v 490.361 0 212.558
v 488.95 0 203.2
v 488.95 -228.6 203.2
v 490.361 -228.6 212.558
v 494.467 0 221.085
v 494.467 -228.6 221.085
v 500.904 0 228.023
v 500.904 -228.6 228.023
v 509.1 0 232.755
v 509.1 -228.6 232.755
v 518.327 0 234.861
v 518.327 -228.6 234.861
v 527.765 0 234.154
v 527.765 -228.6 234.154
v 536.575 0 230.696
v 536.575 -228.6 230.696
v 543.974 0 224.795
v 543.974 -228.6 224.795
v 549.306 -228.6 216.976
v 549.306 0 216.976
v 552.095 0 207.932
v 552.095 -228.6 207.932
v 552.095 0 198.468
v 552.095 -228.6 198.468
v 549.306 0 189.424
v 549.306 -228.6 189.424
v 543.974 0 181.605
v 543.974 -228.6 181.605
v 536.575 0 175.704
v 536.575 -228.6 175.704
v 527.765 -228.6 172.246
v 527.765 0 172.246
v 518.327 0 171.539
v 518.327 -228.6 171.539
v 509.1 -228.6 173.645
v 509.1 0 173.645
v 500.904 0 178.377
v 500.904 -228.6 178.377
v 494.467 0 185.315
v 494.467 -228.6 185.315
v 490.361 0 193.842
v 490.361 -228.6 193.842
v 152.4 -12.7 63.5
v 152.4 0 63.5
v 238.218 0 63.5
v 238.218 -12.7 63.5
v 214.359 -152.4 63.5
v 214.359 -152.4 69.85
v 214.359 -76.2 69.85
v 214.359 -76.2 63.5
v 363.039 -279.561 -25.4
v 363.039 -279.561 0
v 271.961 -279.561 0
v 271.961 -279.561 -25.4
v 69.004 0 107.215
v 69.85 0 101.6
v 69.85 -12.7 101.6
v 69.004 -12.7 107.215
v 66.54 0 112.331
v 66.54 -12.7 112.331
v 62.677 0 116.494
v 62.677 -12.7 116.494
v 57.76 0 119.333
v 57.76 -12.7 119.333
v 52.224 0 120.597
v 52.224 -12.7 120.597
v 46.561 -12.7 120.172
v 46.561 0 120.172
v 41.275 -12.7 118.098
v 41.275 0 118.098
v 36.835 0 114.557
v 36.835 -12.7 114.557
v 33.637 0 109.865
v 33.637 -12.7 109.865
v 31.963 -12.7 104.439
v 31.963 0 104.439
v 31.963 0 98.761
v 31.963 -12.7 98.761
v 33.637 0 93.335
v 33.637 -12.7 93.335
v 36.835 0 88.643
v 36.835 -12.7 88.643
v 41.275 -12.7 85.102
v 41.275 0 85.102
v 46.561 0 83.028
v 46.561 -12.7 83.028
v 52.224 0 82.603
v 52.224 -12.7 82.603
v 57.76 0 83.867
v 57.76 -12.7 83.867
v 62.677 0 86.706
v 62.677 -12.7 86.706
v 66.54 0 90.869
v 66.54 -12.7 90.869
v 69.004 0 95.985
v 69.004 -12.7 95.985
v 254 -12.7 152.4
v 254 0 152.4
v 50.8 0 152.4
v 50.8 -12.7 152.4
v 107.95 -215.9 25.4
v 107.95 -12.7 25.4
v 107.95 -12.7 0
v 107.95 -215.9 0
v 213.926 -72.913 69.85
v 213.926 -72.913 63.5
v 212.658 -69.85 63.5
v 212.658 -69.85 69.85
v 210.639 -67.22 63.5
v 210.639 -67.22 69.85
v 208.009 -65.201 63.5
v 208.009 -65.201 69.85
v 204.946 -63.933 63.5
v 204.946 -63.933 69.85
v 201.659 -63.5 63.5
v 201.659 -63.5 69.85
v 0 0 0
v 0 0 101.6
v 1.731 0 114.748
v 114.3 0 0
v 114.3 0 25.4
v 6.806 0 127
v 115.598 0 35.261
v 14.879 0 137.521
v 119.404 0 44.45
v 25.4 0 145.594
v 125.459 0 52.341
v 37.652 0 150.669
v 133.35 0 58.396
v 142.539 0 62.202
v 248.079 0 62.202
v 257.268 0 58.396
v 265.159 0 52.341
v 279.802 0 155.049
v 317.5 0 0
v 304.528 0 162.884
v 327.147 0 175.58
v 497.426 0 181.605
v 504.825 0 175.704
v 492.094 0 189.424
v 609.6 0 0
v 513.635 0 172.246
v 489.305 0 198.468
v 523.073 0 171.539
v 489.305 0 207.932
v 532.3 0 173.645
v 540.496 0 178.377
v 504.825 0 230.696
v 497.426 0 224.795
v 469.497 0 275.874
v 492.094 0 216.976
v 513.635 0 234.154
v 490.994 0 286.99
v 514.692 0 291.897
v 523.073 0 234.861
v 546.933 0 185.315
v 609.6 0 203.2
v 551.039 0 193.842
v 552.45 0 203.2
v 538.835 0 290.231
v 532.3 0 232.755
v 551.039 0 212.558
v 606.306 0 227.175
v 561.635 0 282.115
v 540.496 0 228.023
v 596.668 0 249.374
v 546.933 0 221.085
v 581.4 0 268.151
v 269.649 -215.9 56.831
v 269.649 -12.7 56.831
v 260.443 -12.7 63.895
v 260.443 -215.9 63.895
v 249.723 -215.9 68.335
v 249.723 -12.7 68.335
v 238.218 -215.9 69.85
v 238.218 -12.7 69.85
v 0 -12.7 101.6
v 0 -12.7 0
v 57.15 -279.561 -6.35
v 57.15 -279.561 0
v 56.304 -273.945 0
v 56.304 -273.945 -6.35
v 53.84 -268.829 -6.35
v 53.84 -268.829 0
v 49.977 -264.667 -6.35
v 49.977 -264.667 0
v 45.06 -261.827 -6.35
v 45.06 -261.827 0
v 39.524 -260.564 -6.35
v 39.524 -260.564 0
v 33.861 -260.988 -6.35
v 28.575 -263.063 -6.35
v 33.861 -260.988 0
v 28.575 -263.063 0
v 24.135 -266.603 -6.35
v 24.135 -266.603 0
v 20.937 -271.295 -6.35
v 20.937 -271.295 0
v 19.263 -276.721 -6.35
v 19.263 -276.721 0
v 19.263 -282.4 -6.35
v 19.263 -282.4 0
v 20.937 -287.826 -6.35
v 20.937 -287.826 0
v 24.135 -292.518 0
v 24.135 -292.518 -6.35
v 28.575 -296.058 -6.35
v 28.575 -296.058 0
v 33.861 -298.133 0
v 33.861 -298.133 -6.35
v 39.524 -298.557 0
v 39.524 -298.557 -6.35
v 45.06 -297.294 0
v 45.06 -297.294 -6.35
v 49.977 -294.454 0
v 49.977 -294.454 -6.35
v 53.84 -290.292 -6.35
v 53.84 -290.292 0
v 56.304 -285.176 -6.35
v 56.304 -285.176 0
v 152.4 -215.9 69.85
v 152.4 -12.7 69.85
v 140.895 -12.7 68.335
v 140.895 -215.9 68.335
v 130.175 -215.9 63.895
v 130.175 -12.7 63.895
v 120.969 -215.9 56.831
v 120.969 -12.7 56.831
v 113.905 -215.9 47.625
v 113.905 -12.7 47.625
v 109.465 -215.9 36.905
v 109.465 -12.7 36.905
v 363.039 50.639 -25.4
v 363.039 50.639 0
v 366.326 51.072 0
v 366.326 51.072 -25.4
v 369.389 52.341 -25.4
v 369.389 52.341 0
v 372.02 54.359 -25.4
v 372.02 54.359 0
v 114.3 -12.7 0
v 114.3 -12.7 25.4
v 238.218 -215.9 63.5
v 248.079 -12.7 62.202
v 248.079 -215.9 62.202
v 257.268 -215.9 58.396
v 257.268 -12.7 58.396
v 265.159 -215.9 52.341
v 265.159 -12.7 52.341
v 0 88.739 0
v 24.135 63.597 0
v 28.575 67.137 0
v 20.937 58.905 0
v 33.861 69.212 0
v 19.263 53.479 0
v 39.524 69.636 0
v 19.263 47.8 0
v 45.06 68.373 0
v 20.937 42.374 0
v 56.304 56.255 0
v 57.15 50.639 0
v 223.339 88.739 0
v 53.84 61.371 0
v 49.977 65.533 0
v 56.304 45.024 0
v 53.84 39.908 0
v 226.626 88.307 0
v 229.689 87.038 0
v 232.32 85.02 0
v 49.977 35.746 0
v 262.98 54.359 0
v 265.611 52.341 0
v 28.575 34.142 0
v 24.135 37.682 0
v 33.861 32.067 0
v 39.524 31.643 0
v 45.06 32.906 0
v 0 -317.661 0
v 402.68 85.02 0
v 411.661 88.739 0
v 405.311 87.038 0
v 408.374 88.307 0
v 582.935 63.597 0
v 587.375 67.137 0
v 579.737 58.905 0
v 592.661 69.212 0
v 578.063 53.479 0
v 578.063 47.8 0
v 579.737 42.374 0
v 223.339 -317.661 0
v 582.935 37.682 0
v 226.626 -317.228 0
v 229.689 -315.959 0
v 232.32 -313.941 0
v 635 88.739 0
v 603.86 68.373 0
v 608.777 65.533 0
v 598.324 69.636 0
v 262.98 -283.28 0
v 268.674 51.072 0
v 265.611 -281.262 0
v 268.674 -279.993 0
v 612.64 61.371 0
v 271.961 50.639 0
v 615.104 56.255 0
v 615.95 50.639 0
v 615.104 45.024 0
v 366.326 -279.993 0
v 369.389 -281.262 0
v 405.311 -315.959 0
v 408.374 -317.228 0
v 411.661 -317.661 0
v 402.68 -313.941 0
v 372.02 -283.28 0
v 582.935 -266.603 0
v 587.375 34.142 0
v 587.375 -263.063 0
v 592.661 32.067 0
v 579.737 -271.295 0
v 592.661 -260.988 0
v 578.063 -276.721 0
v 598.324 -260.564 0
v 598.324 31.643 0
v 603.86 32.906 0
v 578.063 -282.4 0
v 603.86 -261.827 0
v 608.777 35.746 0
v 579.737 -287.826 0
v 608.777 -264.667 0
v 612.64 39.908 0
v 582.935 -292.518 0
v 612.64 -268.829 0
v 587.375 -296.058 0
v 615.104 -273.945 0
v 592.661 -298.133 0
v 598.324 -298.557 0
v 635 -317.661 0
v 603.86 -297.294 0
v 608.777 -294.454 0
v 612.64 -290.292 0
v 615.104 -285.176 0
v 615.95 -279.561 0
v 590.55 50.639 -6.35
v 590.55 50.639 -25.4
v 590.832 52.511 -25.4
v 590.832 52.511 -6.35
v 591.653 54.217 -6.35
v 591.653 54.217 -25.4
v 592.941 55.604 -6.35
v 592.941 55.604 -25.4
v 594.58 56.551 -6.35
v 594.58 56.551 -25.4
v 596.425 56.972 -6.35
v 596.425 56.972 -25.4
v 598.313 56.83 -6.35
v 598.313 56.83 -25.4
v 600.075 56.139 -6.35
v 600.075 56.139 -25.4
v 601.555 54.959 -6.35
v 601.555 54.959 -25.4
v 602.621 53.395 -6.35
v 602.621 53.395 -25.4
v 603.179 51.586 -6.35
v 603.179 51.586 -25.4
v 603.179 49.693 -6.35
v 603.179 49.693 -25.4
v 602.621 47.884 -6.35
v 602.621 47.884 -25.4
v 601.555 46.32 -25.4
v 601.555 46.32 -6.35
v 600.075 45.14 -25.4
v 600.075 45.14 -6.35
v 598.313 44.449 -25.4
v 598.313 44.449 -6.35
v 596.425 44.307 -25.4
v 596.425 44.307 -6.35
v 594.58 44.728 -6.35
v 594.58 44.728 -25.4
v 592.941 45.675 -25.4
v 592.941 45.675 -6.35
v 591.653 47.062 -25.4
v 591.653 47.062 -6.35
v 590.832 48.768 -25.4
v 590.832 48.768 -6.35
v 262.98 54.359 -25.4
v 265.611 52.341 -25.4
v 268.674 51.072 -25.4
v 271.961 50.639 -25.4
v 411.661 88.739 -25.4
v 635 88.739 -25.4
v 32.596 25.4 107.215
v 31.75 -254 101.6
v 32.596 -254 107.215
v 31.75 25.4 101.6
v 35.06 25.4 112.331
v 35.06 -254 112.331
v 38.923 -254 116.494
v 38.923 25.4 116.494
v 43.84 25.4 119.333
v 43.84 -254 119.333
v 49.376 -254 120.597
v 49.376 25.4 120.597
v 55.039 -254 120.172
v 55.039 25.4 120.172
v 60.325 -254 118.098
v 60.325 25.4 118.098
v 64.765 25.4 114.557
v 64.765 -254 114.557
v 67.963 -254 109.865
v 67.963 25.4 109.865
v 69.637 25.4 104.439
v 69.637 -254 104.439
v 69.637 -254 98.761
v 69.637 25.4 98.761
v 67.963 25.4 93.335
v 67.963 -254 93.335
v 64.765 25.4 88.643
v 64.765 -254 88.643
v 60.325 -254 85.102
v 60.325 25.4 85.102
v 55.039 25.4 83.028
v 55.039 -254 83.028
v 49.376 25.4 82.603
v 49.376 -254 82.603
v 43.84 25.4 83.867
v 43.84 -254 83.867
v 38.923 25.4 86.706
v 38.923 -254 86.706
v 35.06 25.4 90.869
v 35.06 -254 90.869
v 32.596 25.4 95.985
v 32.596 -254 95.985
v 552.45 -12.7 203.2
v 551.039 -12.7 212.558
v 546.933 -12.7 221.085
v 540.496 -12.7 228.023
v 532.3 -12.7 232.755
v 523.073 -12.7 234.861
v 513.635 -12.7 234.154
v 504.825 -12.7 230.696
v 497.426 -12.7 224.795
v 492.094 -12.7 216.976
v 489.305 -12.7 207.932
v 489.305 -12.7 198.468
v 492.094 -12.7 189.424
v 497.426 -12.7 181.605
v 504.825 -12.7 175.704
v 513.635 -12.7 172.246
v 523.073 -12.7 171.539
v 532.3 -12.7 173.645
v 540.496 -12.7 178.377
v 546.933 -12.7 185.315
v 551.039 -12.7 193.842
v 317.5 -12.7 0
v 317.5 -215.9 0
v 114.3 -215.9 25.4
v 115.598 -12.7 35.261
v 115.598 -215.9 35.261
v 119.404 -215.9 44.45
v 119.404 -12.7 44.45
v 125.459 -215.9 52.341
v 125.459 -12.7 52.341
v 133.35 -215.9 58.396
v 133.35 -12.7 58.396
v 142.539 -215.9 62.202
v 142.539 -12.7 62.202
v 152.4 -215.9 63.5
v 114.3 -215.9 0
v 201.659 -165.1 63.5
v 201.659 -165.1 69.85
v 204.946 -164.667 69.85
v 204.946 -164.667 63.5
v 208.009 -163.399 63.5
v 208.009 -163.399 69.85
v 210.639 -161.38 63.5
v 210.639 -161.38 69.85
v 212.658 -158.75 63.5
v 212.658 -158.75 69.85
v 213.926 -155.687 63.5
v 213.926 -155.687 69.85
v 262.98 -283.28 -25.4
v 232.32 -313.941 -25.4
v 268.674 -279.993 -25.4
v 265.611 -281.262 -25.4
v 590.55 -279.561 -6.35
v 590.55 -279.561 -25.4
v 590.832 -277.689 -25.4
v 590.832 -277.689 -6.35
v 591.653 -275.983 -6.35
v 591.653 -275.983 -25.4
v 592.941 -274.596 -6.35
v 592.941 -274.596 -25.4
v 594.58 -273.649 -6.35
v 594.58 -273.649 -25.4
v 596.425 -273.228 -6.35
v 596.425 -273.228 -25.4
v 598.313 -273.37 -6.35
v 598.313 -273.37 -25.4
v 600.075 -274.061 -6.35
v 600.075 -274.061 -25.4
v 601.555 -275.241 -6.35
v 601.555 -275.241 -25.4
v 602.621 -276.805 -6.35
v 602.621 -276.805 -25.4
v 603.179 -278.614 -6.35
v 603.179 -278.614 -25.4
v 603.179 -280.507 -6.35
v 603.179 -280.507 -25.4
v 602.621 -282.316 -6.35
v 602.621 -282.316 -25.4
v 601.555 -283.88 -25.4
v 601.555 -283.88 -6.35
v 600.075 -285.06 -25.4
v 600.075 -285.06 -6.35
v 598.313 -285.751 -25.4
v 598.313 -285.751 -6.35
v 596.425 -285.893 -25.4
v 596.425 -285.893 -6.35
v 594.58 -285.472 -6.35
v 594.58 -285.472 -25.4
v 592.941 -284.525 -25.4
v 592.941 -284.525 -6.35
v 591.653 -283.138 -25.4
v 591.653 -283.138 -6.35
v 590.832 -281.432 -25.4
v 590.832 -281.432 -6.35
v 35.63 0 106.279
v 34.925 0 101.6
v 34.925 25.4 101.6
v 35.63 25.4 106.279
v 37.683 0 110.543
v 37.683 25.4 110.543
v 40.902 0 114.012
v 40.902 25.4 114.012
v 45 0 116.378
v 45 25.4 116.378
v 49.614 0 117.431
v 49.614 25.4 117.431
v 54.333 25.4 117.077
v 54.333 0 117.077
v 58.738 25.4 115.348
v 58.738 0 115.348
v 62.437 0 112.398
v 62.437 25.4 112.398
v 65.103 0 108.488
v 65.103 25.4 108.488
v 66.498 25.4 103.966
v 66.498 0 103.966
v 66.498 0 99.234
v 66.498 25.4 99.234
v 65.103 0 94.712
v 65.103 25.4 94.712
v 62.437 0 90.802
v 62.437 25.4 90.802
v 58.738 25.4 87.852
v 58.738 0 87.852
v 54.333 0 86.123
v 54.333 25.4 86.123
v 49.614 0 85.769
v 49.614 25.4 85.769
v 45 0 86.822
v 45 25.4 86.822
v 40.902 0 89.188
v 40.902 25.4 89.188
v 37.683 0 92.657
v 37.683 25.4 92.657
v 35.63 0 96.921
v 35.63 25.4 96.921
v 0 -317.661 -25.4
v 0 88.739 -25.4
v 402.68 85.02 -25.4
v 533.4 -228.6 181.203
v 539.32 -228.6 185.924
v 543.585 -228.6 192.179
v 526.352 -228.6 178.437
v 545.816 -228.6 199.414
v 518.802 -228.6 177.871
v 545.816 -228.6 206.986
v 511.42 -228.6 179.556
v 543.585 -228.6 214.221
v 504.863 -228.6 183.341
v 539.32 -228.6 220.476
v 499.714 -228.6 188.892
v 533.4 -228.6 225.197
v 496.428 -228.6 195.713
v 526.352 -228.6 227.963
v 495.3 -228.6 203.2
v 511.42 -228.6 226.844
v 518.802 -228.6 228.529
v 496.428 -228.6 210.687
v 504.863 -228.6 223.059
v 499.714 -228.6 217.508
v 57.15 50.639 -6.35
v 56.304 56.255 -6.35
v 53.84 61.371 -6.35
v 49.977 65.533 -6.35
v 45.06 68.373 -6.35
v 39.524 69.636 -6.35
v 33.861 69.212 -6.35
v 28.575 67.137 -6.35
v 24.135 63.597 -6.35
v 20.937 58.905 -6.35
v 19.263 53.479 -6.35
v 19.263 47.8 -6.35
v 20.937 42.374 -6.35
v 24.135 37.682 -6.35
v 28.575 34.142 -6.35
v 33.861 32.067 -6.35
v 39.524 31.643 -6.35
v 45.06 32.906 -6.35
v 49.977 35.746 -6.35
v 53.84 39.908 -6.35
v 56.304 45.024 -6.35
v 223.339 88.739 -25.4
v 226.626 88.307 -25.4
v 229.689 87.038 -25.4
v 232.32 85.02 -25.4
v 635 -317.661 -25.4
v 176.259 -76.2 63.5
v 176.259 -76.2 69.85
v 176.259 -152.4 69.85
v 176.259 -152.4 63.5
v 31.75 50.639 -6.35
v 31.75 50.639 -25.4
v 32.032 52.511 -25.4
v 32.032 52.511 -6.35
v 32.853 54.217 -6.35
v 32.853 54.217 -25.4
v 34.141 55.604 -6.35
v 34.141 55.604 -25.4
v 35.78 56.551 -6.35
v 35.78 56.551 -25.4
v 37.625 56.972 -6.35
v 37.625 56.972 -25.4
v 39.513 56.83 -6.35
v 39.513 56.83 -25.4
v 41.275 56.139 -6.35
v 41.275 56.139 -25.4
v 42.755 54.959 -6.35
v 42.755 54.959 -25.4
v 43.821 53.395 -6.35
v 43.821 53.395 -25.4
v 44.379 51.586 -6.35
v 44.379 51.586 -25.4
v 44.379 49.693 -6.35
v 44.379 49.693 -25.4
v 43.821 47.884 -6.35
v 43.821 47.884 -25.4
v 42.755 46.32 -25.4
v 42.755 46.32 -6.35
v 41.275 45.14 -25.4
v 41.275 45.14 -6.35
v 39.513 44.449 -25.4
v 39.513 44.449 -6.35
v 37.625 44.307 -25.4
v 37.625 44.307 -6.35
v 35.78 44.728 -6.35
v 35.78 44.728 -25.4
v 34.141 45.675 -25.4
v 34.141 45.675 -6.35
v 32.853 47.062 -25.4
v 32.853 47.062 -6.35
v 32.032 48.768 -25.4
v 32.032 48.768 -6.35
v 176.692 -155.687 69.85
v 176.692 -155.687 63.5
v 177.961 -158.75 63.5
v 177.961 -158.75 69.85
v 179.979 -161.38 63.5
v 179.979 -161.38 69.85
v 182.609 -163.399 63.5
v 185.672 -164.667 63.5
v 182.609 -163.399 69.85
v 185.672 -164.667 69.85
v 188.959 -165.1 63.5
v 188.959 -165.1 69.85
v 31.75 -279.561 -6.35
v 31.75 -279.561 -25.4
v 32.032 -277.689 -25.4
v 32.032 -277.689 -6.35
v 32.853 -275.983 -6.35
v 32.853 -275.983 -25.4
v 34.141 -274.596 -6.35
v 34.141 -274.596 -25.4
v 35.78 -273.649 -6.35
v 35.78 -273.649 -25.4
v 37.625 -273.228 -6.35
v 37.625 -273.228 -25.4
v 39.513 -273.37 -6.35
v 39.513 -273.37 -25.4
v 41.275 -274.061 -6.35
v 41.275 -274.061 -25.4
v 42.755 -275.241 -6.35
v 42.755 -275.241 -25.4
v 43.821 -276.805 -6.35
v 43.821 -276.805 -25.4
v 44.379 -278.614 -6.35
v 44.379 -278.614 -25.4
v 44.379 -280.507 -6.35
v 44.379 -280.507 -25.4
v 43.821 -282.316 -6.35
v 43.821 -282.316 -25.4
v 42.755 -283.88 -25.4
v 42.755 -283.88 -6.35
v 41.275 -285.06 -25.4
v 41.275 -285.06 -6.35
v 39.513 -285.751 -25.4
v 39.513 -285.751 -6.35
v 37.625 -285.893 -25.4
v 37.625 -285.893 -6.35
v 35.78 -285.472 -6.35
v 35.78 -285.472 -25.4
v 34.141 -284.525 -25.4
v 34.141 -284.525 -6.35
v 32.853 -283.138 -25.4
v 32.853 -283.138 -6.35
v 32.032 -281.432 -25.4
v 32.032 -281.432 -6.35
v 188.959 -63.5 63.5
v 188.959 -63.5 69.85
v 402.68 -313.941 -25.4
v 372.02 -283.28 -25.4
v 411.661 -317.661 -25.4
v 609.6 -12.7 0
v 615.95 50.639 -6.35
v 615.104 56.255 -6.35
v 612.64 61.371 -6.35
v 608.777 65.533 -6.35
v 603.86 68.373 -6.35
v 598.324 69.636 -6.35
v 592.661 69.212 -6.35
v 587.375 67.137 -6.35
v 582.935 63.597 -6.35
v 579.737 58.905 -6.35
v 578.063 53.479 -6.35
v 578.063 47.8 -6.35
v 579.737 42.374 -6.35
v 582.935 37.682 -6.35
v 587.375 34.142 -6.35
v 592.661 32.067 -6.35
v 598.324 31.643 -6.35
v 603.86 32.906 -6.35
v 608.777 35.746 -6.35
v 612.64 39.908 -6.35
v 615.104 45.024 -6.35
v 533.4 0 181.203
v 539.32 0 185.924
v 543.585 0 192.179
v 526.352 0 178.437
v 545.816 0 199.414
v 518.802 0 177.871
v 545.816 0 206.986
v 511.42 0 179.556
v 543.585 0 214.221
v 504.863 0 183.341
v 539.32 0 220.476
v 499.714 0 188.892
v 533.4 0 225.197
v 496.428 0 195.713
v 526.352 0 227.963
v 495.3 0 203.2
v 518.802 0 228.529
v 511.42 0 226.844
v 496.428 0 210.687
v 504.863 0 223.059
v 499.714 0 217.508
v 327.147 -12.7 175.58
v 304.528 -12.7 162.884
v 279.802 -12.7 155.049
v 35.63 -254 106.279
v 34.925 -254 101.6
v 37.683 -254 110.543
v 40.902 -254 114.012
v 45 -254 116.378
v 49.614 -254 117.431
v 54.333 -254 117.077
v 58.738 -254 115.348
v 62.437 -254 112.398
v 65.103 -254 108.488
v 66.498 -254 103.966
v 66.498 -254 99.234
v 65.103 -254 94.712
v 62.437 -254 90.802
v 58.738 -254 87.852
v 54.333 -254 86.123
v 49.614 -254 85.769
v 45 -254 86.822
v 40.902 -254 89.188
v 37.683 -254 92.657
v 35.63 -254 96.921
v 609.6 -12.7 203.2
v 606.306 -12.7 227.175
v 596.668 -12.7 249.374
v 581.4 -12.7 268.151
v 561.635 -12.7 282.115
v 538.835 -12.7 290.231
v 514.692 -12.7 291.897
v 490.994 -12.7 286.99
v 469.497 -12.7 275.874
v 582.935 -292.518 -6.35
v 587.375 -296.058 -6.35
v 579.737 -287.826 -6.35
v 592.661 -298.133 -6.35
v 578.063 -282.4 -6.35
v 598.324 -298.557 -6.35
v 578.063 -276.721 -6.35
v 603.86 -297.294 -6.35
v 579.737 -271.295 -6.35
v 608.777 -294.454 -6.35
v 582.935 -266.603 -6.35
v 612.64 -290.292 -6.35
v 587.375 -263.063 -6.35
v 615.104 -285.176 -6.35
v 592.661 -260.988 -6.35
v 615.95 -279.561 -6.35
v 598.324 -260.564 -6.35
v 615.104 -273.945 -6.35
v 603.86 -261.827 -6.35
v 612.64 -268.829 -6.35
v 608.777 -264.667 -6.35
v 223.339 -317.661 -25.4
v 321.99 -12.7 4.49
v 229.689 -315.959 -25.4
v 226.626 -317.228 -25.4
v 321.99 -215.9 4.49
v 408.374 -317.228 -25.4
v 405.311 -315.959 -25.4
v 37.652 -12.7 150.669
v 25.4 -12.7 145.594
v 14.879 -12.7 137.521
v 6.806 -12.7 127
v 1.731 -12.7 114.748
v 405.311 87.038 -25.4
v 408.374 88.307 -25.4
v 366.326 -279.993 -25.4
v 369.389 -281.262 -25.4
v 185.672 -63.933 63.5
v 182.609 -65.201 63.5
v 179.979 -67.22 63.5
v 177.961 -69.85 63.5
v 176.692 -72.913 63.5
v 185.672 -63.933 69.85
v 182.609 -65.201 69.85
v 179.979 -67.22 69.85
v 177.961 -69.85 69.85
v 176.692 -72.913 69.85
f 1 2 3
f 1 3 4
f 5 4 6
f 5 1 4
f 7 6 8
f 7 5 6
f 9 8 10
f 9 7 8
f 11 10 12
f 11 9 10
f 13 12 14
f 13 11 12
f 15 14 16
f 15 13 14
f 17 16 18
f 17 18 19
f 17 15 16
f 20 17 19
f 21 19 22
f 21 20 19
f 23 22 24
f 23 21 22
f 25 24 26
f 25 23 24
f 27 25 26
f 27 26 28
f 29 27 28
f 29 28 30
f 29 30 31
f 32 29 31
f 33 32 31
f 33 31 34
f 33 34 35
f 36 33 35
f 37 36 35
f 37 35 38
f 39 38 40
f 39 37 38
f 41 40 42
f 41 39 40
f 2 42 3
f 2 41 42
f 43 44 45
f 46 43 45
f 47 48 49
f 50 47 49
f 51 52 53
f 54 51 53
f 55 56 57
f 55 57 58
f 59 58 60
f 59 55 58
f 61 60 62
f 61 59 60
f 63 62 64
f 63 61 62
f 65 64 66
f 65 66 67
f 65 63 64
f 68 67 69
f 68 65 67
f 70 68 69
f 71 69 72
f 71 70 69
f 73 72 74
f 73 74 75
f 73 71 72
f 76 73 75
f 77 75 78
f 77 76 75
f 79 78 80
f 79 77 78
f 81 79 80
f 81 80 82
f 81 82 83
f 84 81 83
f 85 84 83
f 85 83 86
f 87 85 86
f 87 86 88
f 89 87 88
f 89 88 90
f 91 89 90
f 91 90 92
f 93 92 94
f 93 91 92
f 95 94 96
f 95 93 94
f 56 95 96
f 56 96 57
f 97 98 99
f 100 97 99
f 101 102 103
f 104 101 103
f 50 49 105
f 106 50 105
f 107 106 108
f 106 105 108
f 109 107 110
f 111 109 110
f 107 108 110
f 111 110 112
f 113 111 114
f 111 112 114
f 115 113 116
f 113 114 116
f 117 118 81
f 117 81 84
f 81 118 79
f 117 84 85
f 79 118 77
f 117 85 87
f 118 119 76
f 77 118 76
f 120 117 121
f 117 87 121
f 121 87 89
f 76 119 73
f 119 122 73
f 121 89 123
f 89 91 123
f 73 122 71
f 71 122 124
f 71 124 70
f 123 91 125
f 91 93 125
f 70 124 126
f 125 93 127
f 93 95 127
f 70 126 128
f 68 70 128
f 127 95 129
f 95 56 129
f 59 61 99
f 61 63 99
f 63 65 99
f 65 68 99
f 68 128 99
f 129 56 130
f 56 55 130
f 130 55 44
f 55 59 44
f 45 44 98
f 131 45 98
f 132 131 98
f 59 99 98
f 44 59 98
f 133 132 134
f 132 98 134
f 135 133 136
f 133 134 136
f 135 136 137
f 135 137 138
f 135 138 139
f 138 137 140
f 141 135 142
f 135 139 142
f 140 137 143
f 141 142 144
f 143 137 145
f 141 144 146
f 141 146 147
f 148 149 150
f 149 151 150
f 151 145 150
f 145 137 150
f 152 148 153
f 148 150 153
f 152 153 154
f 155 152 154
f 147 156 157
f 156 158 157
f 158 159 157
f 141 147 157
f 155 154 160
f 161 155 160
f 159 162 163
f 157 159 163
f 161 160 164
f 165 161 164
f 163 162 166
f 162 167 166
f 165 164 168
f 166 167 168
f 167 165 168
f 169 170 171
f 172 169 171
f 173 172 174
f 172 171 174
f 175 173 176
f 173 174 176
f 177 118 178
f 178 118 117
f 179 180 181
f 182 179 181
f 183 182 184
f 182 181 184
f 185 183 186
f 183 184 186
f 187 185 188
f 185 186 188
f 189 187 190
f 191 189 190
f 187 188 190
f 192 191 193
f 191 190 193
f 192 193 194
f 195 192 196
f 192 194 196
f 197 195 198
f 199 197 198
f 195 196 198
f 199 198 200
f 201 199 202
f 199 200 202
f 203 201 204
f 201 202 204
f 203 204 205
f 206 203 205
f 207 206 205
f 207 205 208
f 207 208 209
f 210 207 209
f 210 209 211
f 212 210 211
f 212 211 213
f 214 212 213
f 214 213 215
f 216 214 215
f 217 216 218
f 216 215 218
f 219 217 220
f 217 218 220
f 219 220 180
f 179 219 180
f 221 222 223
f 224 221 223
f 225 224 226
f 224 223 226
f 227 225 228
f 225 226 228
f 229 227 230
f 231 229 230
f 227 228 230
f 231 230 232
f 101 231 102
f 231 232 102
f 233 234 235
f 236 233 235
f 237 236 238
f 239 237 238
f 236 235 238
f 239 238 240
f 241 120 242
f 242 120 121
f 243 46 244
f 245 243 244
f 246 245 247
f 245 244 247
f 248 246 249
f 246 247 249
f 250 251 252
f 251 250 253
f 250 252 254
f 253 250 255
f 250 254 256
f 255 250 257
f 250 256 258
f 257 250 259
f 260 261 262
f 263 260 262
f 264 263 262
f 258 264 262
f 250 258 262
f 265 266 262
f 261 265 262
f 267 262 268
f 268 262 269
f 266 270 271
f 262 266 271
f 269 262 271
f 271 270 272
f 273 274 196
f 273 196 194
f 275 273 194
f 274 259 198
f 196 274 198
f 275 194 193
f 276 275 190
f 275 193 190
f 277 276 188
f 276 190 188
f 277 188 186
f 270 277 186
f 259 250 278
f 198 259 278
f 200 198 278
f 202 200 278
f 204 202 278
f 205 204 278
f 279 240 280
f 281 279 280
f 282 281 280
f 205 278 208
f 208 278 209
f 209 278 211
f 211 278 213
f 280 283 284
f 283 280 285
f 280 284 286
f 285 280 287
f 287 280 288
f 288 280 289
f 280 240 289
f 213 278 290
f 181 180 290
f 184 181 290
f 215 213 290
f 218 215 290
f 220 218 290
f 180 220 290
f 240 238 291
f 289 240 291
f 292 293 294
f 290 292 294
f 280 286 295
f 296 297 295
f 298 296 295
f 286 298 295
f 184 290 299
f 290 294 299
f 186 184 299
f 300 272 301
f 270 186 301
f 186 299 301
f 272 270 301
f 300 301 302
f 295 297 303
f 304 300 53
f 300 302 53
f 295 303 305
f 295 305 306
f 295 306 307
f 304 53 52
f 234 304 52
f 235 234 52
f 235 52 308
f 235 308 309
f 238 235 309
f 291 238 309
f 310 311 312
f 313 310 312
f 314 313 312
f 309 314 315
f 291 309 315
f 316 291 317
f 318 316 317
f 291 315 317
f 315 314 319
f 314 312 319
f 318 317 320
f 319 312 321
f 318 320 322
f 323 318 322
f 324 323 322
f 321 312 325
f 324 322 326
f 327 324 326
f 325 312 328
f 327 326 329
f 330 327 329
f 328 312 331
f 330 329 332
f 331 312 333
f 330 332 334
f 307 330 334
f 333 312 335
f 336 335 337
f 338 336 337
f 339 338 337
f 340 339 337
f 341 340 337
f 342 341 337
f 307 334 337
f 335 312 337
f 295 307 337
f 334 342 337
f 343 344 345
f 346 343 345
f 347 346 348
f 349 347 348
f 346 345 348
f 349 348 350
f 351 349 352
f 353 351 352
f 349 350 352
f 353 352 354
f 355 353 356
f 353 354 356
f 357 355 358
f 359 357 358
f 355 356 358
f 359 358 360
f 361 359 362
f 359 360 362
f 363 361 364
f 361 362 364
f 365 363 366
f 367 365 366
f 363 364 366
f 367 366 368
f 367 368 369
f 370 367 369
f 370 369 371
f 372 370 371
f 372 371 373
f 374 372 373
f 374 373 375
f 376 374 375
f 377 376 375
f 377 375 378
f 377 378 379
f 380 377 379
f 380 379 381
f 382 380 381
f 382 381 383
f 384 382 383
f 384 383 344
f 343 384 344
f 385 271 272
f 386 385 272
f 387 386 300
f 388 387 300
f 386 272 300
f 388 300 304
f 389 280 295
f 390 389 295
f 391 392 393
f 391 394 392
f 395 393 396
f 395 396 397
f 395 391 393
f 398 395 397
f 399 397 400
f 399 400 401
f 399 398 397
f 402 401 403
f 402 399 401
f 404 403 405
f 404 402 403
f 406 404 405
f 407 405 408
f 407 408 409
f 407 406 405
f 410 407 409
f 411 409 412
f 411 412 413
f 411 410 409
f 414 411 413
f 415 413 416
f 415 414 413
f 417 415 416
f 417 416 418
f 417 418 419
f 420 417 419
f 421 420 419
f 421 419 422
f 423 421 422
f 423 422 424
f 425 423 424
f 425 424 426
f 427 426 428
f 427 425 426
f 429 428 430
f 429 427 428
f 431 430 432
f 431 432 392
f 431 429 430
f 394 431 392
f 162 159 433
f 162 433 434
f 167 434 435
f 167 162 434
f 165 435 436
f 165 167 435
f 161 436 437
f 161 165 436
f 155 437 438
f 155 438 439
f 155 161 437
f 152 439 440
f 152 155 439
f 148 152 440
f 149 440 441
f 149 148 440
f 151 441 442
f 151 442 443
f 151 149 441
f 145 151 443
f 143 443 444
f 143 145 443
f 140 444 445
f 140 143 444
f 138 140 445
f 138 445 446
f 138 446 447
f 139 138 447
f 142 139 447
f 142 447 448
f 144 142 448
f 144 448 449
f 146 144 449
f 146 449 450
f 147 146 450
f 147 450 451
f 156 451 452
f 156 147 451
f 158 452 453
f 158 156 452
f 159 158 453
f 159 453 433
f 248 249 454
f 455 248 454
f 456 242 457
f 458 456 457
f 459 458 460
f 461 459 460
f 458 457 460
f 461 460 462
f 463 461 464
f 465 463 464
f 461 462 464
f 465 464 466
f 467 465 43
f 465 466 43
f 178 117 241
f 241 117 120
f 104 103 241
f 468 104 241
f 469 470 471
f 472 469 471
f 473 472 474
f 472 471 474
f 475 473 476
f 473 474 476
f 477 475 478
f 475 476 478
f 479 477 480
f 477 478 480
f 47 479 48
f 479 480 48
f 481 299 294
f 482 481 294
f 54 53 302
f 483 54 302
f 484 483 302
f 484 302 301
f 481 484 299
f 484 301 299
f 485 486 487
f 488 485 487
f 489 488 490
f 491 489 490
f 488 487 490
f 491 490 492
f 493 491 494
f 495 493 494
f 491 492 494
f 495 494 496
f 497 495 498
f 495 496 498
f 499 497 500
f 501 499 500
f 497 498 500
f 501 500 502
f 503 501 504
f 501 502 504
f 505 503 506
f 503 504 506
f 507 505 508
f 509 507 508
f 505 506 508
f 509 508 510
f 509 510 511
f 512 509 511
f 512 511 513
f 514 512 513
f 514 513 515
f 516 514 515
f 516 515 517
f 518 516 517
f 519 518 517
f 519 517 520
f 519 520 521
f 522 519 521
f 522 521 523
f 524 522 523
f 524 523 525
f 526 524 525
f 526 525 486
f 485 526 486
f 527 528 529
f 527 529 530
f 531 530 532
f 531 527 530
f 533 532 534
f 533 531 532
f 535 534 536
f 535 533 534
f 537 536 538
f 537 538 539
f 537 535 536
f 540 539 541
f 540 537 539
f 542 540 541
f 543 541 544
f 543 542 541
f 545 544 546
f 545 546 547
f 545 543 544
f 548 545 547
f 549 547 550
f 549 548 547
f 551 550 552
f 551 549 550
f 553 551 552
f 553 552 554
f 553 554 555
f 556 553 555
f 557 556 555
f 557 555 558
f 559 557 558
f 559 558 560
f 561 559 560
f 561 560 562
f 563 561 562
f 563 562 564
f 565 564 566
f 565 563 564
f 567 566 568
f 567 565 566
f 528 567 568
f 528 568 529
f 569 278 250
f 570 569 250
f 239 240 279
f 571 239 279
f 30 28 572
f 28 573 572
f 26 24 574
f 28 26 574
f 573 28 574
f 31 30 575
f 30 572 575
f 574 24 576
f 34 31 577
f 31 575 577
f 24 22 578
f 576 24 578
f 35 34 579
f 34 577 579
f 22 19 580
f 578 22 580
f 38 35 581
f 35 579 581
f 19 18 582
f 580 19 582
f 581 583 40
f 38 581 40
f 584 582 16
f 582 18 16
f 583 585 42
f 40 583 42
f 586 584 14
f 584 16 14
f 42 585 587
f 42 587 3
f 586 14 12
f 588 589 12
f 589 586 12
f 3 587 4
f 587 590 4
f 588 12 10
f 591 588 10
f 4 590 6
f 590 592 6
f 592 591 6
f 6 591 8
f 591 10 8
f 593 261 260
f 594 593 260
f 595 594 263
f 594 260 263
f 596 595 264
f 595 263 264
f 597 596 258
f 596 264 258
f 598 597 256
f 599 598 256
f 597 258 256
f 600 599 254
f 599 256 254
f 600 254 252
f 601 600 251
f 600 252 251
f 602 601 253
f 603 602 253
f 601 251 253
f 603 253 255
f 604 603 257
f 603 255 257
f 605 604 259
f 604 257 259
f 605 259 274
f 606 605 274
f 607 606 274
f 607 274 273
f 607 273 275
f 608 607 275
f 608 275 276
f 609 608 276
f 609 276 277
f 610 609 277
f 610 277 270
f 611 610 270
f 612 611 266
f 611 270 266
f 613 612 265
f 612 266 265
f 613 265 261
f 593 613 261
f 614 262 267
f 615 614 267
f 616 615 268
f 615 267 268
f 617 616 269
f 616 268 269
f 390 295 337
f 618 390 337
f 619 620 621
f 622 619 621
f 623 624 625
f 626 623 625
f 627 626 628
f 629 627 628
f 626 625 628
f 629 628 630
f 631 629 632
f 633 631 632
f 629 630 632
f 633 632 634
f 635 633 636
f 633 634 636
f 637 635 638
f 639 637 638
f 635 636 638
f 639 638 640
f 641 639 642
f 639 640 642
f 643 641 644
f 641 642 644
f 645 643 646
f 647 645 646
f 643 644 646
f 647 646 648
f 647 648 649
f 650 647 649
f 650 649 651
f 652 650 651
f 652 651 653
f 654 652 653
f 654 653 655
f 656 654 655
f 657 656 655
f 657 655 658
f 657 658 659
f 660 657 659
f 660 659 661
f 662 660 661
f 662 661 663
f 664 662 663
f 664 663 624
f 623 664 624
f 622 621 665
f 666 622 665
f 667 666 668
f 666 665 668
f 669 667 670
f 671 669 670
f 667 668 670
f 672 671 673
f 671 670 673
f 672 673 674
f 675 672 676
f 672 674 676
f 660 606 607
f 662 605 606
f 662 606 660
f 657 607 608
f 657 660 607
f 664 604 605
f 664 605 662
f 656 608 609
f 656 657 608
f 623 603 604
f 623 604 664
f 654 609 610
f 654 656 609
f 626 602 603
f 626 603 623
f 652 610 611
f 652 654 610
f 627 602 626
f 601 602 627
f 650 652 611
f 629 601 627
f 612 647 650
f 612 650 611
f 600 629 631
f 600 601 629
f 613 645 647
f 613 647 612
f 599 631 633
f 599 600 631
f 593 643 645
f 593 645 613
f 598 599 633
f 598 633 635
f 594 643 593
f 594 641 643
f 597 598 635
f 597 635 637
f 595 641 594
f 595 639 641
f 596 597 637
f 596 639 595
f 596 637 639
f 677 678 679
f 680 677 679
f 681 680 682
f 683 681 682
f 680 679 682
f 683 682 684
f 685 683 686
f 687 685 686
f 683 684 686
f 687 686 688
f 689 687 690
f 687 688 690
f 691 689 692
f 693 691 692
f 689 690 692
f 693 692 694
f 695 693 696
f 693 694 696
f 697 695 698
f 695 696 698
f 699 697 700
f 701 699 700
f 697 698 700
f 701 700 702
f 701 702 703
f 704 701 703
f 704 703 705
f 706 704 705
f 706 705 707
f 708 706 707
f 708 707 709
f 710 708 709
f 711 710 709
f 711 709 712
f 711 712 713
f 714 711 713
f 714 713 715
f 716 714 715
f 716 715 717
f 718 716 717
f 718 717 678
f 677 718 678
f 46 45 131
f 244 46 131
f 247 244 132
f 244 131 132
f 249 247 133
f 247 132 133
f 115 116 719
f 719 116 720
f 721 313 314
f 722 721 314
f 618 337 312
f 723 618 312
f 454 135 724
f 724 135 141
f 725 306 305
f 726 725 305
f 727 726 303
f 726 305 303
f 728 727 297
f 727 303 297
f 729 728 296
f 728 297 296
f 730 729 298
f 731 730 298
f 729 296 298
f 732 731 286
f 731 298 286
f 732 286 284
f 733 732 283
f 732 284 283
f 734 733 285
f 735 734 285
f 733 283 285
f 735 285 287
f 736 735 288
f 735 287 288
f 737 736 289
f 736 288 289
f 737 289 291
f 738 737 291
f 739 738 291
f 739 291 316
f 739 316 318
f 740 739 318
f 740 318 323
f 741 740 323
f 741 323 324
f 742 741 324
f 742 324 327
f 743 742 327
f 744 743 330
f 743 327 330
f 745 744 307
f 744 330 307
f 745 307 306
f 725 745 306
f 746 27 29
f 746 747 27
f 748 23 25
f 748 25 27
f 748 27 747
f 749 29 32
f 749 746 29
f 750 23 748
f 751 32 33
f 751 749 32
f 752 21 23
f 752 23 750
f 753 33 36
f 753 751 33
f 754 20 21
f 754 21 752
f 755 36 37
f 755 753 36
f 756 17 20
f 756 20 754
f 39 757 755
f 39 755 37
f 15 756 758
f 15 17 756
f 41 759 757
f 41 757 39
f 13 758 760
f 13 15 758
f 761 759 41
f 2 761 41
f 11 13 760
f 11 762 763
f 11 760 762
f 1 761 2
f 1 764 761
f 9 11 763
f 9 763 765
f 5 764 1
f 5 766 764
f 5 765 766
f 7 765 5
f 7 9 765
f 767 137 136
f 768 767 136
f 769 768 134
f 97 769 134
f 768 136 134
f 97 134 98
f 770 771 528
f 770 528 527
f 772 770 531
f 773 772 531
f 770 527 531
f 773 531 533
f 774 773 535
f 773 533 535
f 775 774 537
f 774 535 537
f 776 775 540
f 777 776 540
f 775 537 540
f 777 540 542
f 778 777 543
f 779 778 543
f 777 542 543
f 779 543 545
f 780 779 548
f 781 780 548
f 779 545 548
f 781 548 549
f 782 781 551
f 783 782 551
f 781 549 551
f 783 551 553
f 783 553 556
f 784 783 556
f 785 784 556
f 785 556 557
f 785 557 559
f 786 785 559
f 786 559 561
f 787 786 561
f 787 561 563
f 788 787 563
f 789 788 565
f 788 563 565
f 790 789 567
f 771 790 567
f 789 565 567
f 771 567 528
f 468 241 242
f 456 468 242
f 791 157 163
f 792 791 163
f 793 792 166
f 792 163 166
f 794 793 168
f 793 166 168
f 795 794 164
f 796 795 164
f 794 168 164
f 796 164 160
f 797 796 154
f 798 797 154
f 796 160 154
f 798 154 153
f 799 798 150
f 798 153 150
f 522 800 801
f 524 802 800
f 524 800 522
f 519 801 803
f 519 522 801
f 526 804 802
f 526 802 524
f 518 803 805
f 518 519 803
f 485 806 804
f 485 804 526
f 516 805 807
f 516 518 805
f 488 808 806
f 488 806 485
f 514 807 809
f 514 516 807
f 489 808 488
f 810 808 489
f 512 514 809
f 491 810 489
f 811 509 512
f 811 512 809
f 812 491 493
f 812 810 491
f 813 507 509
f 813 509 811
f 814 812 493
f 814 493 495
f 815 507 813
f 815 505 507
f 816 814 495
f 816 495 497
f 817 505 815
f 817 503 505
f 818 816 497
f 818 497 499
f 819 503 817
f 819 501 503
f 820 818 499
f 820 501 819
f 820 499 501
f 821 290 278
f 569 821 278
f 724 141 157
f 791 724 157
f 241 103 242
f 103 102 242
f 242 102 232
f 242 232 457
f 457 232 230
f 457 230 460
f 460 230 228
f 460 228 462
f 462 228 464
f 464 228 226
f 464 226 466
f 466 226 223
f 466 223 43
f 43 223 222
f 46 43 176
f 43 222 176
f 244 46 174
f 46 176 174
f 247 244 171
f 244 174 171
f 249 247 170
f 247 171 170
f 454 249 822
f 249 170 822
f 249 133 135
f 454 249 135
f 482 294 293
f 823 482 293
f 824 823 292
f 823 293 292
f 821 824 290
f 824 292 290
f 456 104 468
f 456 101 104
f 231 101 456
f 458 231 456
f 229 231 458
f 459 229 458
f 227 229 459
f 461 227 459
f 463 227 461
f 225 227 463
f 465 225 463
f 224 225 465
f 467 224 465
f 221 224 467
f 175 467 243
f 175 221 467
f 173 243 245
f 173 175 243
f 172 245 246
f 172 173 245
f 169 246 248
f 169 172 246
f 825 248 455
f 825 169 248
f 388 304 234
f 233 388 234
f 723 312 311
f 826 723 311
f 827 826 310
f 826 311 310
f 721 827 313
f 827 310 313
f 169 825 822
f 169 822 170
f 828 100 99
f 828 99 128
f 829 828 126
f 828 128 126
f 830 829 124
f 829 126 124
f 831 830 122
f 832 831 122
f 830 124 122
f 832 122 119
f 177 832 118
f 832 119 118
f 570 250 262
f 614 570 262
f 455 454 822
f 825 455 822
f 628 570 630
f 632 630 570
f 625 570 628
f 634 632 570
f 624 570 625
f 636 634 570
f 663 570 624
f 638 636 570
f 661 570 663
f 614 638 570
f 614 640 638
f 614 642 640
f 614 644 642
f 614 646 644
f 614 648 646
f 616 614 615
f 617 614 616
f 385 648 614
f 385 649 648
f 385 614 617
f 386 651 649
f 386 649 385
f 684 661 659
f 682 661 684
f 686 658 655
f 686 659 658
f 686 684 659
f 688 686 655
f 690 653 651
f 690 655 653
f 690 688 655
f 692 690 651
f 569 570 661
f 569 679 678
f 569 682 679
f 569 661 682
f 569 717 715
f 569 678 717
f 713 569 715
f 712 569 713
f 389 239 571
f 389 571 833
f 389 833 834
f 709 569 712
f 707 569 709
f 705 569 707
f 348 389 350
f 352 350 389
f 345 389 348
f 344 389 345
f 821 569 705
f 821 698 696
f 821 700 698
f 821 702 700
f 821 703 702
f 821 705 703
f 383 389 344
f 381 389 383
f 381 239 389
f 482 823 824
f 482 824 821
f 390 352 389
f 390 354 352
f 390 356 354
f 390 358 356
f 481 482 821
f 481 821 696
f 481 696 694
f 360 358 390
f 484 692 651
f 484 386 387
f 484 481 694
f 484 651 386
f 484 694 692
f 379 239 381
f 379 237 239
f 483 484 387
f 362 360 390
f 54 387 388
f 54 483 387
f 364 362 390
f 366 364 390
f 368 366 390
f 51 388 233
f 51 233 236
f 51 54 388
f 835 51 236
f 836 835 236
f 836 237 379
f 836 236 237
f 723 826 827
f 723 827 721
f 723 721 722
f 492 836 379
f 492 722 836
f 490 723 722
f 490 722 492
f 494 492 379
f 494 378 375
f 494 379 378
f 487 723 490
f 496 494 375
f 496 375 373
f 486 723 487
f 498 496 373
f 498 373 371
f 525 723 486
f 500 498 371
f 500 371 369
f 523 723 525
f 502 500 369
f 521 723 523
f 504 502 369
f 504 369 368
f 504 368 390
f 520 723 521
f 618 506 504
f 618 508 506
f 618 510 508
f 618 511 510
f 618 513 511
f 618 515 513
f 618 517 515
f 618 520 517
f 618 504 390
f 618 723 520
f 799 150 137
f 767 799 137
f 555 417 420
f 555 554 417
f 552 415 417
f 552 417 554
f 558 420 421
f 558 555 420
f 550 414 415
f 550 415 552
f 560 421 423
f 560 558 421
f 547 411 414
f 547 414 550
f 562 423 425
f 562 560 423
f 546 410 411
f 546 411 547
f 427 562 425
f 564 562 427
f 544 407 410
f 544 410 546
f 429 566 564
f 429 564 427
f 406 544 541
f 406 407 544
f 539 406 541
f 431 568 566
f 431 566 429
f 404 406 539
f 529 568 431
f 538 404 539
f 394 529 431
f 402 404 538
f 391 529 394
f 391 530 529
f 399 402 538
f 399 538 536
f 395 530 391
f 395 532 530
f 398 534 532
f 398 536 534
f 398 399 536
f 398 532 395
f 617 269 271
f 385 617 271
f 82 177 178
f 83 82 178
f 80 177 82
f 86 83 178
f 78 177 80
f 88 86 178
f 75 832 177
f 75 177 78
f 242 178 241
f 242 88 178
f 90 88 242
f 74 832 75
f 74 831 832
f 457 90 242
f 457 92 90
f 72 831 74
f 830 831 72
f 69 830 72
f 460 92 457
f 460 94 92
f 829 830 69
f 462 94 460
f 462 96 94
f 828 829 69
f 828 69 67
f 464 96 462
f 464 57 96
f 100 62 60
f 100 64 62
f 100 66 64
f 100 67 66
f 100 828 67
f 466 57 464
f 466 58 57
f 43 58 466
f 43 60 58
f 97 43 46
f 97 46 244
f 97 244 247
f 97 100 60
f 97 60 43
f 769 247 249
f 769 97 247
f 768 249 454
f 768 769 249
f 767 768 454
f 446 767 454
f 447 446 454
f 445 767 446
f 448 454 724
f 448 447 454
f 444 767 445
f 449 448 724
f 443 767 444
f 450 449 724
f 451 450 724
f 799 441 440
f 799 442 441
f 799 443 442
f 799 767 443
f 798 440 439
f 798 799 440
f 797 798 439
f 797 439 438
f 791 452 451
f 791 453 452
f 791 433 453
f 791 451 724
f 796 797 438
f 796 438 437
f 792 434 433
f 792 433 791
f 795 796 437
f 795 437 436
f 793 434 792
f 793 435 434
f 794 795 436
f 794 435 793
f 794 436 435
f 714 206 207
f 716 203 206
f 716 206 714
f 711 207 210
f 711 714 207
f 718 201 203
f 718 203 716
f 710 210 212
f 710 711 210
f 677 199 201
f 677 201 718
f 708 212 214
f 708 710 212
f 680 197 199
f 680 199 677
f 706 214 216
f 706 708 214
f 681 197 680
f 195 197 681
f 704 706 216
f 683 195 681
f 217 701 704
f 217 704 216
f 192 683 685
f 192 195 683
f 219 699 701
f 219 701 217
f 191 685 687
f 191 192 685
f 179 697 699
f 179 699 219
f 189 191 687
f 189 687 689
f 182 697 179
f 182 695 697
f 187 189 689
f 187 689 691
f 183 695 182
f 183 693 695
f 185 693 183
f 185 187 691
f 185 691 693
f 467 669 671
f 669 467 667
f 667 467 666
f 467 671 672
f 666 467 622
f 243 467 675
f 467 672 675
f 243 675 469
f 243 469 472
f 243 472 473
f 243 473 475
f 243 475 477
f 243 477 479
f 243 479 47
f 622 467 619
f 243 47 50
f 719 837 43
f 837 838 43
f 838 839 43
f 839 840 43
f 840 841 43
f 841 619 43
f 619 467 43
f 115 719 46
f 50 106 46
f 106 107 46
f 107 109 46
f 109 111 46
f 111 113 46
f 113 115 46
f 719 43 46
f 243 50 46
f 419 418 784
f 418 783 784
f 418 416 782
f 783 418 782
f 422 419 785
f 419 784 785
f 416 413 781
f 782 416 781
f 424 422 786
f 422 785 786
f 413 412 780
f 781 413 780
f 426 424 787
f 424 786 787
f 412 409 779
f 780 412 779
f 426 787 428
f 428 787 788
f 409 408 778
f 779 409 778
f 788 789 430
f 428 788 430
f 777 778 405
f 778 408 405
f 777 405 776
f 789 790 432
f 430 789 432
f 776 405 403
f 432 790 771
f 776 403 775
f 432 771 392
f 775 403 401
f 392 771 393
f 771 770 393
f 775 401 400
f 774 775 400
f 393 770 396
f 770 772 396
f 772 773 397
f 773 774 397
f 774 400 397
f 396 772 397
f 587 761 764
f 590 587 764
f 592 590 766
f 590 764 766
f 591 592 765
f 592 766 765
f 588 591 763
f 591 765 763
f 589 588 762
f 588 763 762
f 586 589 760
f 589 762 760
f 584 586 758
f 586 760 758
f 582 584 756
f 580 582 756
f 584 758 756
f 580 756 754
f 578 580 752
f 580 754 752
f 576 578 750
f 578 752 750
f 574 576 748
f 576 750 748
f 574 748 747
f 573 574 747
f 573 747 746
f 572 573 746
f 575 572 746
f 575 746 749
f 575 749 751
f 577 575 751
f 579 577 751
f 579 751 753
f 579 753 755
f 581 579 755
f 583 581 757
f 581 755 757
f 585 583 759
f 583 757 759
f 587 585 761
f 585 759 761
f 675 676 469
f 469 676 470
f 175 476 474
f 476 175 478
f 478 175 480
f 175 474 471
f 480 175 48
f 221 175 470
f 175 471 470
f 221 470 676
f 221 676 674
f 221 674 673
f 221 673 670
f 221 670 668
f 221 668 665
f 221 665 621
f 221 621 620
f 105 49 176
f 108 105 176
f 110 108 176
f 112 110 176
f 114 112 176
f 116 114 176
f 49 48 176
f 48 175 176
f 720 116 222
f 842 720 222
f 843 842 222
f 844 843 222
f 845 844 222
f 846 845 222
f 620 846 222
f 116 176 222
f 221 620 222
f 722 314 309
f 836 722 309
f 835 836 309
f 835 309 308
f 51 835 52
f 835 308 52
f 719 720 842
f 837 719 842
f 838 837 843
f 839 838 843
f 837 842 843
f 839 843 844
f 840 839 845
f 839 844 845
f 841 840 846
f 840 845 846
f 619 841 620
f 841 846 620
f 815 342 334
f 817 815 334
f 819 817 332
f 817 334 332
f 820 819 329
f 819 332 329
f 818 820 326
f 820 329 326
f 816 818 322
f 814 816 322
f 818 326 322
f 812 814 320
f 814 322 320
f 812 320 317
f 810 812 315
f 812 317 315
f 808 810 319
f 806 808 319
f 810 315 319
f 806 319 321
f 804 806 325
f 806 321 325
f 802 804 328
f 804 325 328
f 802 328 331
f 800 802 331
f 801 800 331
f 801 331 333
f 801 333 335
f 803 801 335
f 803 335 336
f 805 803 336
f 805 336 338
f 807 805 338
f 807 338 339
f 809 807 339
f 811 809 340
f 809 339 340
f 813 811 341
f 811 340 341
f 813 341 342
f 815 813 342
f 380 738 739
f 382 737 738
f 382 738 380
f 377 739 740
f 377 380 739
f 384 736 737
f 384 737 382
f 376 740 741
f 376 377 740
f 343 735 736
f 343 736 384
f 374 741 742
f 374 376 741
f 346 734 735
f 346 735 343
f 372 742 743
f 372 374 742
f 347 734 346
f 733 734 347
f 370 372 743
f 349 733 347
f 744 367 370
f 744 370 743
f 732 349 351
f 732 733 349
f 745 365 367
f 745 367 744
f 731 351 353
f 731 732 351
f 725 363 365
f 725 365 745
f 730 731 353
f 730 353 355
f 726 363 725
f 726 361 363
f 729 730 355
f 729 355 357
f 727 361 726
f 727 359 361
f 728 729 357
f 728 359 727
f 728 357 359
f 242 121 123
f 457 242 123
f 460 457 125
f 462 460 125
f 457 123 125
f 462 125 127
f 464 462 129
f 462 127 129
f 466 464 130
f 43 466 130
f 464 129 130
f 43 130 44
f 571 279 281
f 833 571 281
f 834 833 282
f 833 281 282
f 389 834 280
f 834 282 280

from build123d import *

# Parameters (mm, degrees)
F0_R           = 19.05
F0_R_2         = 31.75
F1_DEPTH       = 12.7
F3_DEPTH       = 25.4
F5_DEPTH       = 203.2
F6_R           = 31.75
F6_R_2         = 25.4000000767
F7_DEPTH       = 228.6
F8_R           = 19.05
F8_R_2         = 6.35
F9_DEPTH       = 6.35
F10_D          = 12.7
F11_R          = 19.05
F11_R_2        = 15.875
F12_DEPTH      = 25.4
F12_DEPTH_BACK = 254
F14_DEPTH      = 25.4


with BuildPart() as f1:
    # F0 (on Front) → F1 (new body)
    with BuildSketch(Plane.XZ):
        with BuildLine():
            Line((0, 101.6), (0, 0))
            Line((0, 0), (114.3, 0))
            Line((114.3, 0), (114.3, 25.4))
            ThreePointArc((114.3, 25.4), (125.4592316368, 52.3407683632), (152.4, 63.5))
            Line((152.4, 63.5), (238.2184632736, 63.5))
            ThreePointArc((238.2184632736, 63.5), (252.7987020467, 60.5998101887), (265.1592316368, 52.3407683632))
            Line((265.1592316368, 52.3407683632), (317.5, 0))
            Line((317.5, 0), (609.6, 0))
            Line((609.6, 0), (609.6, 203.2))
            ThreePointArc((609.6, 203.2), (561.634643106, 282.1149225038), (469.4973004774, 275.8738850041))
            Line((469.4973004774, 275.8738850041), (327.1467136038, 175.5801642798))
            ThreePointArc((327.1467136038, 175.5801642798), (292.3658758764, 158.3336563357), (254, 152.4))
            Line((254, 152.4), (50.8, 152.4))
            ThreePointArc((50.8, 152.4), (14.8789755157, 137.5210244843), (0, 101.6))
        make_face()
        with Locations((50.8, 101.6)):
            Circle(F0_R, mode=Mode.SUBTRACT)
        with Locations((520.7, 203.2)):
            Circle(F0_R_2, mode=Mode.SUBTRACT)
    extrude(amount=F1_DEPTH)


with BuildPart() as f3:
    # F2 (on face) → F3 (new body)
    with BuildSketch(Plane(origin=(0, 0, 0), x_dir=(1, 0, 0), z_dir=(0, 0, -1))):
        with BuildLine():
            Line((411.6605122421, -88.7394899882), (635, -88.7394899882))
            Line((635, -88.7394899882), (635, 317.6605100118))
            Line((635, 317.6605100118), (411.6605122421, 317.6605100118))
            ThreePointArc((411.6605122421, 317.6605100118), (406.8004326511, 316.6937800747), (402.6802561211, 313.9407661328))
            Line((402.6802561211, 313.9407661328), (372.0197438789, 283.2802538907))
            ThreePointArc((372.0197438789, 283.2802538907), (367.8995673489, 280.5272399489), (363.0394877579, 279.5605100118))
            Line((363.0394877579, 279.5605100118), (271.9605122421, 279.5605100118))
            ThreePointArc((271.9605122421, 279.5605100118), (267.1004326511, 280.5272399489), (262.9802561211, 283.2802538907))
            Line((262.9802561211, 283.2802538907), (232.3197438789, 313.9407661328))
            ThreePointArc((232.3197438789, 313.9407661328), (228.1995673489, 316.6937800747), (223.3394877579, 317.6605100118))
            Line((223.3394877579, 317.6605100118), (0, 317.6605100118))
            Line((0, 317.6605100118), (0, -88.7394899882))
            Line((0, -88.7394899882), (223.3394877579, -88.7394899882))
            ThreePointArc((223.3394877579, -88.7394899882), (228.1995673489, -87.7727600511), (232.3197438789, -85.0197461093))
            Line((232.3197438789, -85.0197461093), (262.9802561211, -54.3592338672))
            ThreePointArc((262.9802561211, -54.3592338672), (267.1004326511, -51.6062199253), (271.9605122421, -50.6394899882))
            Line((271.9605122421, -50.6394899882), (363.0394877579, -50.6394899882))
            ThreePointArc((363.0394877579, -50.6394899882), (367.8995673489, -51.6062199253), (372.0197438789, -54.3592338672))
            Line((372.0197438789, -54.3592338672), (402.6802561211, -85.0197461093))
            ThreePointArc((402.6802561211, -85.0197461093), (406.8004326511, -87.7727600511), (411.6605122421, -88.7394899882))
        make_face()
    extrude(amount=F3_DEPTH)

    # F8 (on face) → F9 (cut, symmetric)
    with BuildSketch(Plane.XY):
        with Locations((596.9, 50.6394899882)):
            Circle(F8_R)
        with Locations((596.9, 50.6394899882)):
            Circle(F8_R_2, mode=Mode.SUBTRACT)
        with Locations((38.1, 50.6394899882)):
            Circle(F8_R)
        with Locations((38.1, 50.6394899882)):
            Circle(F8_R_2, mode=Mode.SUBTRACT)
        with Locations((38.1, -279.5605100118)):
            Circle(F8_R)
        with Locations((38.1, -279.5605100118)):
            Circle(F8_R_2, mode=Mode.SUBTRACT)
        with Locations((596.9, -279.5605100118)):
            Circle(F8_R)
        with Locations((596.9, -279.5605100118)):
            Circle(F8_R_2, mode=Mode.SUBTRACT)
        with Locations((596.9, -279.5605100118)):
            Circle(F8_R_2)
        with Locations((596.9, 50.6394899882)):
            Circle(F8_R_2)
        with Locations((38.1, -279.5605100118)):
            Circle(F8_R_2)
        with Locations((38.1, 50.6394899882)):
            Circle(F8_R_2)
    extrude(amount=F9_DEPTH, both=True, mode=Mode.SUBTRACT)

    # F10 (through all)
    with Locations(Plane.XY):
        with Locations((38.1, -279.5605100118), (38.1, 50.6394899882), (596.9, -279.5605100118), (596.9, 50.6394899882)):
            Hole(F10_D / 2)


with BuildPart() as f5:
    # F4 (on face) → F5 (new body)
    with BuildSketch(Plane.XZ.offset(12.7)):
        with BuildLine():
            Line((107.95, 0), (114.3, 0))
            Line((114.3, 0), (114.3, 25.4))
            ThreePointArc((114.3, 25.4), (125.4592316368, 52.3407683632), (152.4, 63.5))
            Line((152.4, 63.5), (238.2184632736, 63.5))
            ThreePointArc((238.2184632736, 63.5), (252.7987020467, 60.5998101887), (265.1592316368, 52.3407683632))
            Line((265.1592316368, 52.3407683632), (317.5, 0))
            Line((317.5, 0), (321.9901280605, 4.4901280605))
            Line((321.9901280605, 4.4901280605), (269.6493596973, 56.8308964237))
            ThreePointArc((269.6493596973, 56.8308964237), (255.2287418422, 66.4664452201), (238.2184632736, 69.85))
            Line((238.2184632736, 69.85), (152.4, 69.85))
            ThreePointArc((152.4, 69.85), (120.9691035763, 56.8308964237), (107.95, 25.4))
            Line((107.95, 25.4), (107.95, 0))
        make_face()
    extrude(amount=F5_DEPTH)

    # F13 (on face) → F14 (cut)
    with BuildSketch(Plane.XY.offset(69.85)):
        with BuildLine():
            Line((201.6592316368, -63.5), (188.9592316368, -63.5))
            ThreePointArc((188.9592316368, -63.5), (179.9789755157, -67.2197438789), (176.2592316368, -76.2))
            Line((176.2592316368, -76.2), (176.2592316368, -152.4))
            ThreePointArc((176.2592316368, -152.4), (179.9789755157, -161.3802561211), (188.9592316368, -165.1))
            Line((188.9592316368, -165.1), (201.6592316368, -165.1))
            ThreePointArc((201.6592316368, -165.1), (210.6394877579, -161.3802561211), (214.3592316368, -152.4))
            Line((214.3592316368, -152.4), (214.3592316368, -76.2))
            ThreePointArc((214.3592316368, -76.2), (210.6394877579, -67.2197438789), (201.6592316368, -63.5))
        make_face()
    extrude(amount=-F14_DEPTH, mode=Mode.SUBTRACT)


with BuildPart() as f7:
    # F6 (on face) → F7 (new body)
    with BuildSketch(Plane(origin=(0, 0, 0), x_dir=(-1, 0, 0), z_dir=(0, 1, 0))):
        with Locations((-520.7, 203.2)):
            Circle(F6_R)
        with Locations((-520.7, 203.2)):
            Circle(F6_R_2, mode=Mode.SUBTRACT)
    extrude(amount=-F7_DEPTH)


with BuildPart() as f12:
    # F11 (on face) → F12 (new body, two sides)
    with BuildSketch(Plane(origin=(0, 0, 0), x_dir=(-1, 0, 0), z_dir=(0, 1, 0))) as f12_sk:
        with Locations((-50.8, 101.6)):
            Circle(F11_R)
        with Locations((-50.8, 101.6)):
            Circle(F11_R_2, mode=Mode.SUBTRACT)
    extrude(amount=F12_DEPTH)
    extrude(f12_sk.sketch, amount=-F12_DEPTH_BACK)


solid = Compound([f1.part, f3.part, f5.part, f7.part, f12.part])
